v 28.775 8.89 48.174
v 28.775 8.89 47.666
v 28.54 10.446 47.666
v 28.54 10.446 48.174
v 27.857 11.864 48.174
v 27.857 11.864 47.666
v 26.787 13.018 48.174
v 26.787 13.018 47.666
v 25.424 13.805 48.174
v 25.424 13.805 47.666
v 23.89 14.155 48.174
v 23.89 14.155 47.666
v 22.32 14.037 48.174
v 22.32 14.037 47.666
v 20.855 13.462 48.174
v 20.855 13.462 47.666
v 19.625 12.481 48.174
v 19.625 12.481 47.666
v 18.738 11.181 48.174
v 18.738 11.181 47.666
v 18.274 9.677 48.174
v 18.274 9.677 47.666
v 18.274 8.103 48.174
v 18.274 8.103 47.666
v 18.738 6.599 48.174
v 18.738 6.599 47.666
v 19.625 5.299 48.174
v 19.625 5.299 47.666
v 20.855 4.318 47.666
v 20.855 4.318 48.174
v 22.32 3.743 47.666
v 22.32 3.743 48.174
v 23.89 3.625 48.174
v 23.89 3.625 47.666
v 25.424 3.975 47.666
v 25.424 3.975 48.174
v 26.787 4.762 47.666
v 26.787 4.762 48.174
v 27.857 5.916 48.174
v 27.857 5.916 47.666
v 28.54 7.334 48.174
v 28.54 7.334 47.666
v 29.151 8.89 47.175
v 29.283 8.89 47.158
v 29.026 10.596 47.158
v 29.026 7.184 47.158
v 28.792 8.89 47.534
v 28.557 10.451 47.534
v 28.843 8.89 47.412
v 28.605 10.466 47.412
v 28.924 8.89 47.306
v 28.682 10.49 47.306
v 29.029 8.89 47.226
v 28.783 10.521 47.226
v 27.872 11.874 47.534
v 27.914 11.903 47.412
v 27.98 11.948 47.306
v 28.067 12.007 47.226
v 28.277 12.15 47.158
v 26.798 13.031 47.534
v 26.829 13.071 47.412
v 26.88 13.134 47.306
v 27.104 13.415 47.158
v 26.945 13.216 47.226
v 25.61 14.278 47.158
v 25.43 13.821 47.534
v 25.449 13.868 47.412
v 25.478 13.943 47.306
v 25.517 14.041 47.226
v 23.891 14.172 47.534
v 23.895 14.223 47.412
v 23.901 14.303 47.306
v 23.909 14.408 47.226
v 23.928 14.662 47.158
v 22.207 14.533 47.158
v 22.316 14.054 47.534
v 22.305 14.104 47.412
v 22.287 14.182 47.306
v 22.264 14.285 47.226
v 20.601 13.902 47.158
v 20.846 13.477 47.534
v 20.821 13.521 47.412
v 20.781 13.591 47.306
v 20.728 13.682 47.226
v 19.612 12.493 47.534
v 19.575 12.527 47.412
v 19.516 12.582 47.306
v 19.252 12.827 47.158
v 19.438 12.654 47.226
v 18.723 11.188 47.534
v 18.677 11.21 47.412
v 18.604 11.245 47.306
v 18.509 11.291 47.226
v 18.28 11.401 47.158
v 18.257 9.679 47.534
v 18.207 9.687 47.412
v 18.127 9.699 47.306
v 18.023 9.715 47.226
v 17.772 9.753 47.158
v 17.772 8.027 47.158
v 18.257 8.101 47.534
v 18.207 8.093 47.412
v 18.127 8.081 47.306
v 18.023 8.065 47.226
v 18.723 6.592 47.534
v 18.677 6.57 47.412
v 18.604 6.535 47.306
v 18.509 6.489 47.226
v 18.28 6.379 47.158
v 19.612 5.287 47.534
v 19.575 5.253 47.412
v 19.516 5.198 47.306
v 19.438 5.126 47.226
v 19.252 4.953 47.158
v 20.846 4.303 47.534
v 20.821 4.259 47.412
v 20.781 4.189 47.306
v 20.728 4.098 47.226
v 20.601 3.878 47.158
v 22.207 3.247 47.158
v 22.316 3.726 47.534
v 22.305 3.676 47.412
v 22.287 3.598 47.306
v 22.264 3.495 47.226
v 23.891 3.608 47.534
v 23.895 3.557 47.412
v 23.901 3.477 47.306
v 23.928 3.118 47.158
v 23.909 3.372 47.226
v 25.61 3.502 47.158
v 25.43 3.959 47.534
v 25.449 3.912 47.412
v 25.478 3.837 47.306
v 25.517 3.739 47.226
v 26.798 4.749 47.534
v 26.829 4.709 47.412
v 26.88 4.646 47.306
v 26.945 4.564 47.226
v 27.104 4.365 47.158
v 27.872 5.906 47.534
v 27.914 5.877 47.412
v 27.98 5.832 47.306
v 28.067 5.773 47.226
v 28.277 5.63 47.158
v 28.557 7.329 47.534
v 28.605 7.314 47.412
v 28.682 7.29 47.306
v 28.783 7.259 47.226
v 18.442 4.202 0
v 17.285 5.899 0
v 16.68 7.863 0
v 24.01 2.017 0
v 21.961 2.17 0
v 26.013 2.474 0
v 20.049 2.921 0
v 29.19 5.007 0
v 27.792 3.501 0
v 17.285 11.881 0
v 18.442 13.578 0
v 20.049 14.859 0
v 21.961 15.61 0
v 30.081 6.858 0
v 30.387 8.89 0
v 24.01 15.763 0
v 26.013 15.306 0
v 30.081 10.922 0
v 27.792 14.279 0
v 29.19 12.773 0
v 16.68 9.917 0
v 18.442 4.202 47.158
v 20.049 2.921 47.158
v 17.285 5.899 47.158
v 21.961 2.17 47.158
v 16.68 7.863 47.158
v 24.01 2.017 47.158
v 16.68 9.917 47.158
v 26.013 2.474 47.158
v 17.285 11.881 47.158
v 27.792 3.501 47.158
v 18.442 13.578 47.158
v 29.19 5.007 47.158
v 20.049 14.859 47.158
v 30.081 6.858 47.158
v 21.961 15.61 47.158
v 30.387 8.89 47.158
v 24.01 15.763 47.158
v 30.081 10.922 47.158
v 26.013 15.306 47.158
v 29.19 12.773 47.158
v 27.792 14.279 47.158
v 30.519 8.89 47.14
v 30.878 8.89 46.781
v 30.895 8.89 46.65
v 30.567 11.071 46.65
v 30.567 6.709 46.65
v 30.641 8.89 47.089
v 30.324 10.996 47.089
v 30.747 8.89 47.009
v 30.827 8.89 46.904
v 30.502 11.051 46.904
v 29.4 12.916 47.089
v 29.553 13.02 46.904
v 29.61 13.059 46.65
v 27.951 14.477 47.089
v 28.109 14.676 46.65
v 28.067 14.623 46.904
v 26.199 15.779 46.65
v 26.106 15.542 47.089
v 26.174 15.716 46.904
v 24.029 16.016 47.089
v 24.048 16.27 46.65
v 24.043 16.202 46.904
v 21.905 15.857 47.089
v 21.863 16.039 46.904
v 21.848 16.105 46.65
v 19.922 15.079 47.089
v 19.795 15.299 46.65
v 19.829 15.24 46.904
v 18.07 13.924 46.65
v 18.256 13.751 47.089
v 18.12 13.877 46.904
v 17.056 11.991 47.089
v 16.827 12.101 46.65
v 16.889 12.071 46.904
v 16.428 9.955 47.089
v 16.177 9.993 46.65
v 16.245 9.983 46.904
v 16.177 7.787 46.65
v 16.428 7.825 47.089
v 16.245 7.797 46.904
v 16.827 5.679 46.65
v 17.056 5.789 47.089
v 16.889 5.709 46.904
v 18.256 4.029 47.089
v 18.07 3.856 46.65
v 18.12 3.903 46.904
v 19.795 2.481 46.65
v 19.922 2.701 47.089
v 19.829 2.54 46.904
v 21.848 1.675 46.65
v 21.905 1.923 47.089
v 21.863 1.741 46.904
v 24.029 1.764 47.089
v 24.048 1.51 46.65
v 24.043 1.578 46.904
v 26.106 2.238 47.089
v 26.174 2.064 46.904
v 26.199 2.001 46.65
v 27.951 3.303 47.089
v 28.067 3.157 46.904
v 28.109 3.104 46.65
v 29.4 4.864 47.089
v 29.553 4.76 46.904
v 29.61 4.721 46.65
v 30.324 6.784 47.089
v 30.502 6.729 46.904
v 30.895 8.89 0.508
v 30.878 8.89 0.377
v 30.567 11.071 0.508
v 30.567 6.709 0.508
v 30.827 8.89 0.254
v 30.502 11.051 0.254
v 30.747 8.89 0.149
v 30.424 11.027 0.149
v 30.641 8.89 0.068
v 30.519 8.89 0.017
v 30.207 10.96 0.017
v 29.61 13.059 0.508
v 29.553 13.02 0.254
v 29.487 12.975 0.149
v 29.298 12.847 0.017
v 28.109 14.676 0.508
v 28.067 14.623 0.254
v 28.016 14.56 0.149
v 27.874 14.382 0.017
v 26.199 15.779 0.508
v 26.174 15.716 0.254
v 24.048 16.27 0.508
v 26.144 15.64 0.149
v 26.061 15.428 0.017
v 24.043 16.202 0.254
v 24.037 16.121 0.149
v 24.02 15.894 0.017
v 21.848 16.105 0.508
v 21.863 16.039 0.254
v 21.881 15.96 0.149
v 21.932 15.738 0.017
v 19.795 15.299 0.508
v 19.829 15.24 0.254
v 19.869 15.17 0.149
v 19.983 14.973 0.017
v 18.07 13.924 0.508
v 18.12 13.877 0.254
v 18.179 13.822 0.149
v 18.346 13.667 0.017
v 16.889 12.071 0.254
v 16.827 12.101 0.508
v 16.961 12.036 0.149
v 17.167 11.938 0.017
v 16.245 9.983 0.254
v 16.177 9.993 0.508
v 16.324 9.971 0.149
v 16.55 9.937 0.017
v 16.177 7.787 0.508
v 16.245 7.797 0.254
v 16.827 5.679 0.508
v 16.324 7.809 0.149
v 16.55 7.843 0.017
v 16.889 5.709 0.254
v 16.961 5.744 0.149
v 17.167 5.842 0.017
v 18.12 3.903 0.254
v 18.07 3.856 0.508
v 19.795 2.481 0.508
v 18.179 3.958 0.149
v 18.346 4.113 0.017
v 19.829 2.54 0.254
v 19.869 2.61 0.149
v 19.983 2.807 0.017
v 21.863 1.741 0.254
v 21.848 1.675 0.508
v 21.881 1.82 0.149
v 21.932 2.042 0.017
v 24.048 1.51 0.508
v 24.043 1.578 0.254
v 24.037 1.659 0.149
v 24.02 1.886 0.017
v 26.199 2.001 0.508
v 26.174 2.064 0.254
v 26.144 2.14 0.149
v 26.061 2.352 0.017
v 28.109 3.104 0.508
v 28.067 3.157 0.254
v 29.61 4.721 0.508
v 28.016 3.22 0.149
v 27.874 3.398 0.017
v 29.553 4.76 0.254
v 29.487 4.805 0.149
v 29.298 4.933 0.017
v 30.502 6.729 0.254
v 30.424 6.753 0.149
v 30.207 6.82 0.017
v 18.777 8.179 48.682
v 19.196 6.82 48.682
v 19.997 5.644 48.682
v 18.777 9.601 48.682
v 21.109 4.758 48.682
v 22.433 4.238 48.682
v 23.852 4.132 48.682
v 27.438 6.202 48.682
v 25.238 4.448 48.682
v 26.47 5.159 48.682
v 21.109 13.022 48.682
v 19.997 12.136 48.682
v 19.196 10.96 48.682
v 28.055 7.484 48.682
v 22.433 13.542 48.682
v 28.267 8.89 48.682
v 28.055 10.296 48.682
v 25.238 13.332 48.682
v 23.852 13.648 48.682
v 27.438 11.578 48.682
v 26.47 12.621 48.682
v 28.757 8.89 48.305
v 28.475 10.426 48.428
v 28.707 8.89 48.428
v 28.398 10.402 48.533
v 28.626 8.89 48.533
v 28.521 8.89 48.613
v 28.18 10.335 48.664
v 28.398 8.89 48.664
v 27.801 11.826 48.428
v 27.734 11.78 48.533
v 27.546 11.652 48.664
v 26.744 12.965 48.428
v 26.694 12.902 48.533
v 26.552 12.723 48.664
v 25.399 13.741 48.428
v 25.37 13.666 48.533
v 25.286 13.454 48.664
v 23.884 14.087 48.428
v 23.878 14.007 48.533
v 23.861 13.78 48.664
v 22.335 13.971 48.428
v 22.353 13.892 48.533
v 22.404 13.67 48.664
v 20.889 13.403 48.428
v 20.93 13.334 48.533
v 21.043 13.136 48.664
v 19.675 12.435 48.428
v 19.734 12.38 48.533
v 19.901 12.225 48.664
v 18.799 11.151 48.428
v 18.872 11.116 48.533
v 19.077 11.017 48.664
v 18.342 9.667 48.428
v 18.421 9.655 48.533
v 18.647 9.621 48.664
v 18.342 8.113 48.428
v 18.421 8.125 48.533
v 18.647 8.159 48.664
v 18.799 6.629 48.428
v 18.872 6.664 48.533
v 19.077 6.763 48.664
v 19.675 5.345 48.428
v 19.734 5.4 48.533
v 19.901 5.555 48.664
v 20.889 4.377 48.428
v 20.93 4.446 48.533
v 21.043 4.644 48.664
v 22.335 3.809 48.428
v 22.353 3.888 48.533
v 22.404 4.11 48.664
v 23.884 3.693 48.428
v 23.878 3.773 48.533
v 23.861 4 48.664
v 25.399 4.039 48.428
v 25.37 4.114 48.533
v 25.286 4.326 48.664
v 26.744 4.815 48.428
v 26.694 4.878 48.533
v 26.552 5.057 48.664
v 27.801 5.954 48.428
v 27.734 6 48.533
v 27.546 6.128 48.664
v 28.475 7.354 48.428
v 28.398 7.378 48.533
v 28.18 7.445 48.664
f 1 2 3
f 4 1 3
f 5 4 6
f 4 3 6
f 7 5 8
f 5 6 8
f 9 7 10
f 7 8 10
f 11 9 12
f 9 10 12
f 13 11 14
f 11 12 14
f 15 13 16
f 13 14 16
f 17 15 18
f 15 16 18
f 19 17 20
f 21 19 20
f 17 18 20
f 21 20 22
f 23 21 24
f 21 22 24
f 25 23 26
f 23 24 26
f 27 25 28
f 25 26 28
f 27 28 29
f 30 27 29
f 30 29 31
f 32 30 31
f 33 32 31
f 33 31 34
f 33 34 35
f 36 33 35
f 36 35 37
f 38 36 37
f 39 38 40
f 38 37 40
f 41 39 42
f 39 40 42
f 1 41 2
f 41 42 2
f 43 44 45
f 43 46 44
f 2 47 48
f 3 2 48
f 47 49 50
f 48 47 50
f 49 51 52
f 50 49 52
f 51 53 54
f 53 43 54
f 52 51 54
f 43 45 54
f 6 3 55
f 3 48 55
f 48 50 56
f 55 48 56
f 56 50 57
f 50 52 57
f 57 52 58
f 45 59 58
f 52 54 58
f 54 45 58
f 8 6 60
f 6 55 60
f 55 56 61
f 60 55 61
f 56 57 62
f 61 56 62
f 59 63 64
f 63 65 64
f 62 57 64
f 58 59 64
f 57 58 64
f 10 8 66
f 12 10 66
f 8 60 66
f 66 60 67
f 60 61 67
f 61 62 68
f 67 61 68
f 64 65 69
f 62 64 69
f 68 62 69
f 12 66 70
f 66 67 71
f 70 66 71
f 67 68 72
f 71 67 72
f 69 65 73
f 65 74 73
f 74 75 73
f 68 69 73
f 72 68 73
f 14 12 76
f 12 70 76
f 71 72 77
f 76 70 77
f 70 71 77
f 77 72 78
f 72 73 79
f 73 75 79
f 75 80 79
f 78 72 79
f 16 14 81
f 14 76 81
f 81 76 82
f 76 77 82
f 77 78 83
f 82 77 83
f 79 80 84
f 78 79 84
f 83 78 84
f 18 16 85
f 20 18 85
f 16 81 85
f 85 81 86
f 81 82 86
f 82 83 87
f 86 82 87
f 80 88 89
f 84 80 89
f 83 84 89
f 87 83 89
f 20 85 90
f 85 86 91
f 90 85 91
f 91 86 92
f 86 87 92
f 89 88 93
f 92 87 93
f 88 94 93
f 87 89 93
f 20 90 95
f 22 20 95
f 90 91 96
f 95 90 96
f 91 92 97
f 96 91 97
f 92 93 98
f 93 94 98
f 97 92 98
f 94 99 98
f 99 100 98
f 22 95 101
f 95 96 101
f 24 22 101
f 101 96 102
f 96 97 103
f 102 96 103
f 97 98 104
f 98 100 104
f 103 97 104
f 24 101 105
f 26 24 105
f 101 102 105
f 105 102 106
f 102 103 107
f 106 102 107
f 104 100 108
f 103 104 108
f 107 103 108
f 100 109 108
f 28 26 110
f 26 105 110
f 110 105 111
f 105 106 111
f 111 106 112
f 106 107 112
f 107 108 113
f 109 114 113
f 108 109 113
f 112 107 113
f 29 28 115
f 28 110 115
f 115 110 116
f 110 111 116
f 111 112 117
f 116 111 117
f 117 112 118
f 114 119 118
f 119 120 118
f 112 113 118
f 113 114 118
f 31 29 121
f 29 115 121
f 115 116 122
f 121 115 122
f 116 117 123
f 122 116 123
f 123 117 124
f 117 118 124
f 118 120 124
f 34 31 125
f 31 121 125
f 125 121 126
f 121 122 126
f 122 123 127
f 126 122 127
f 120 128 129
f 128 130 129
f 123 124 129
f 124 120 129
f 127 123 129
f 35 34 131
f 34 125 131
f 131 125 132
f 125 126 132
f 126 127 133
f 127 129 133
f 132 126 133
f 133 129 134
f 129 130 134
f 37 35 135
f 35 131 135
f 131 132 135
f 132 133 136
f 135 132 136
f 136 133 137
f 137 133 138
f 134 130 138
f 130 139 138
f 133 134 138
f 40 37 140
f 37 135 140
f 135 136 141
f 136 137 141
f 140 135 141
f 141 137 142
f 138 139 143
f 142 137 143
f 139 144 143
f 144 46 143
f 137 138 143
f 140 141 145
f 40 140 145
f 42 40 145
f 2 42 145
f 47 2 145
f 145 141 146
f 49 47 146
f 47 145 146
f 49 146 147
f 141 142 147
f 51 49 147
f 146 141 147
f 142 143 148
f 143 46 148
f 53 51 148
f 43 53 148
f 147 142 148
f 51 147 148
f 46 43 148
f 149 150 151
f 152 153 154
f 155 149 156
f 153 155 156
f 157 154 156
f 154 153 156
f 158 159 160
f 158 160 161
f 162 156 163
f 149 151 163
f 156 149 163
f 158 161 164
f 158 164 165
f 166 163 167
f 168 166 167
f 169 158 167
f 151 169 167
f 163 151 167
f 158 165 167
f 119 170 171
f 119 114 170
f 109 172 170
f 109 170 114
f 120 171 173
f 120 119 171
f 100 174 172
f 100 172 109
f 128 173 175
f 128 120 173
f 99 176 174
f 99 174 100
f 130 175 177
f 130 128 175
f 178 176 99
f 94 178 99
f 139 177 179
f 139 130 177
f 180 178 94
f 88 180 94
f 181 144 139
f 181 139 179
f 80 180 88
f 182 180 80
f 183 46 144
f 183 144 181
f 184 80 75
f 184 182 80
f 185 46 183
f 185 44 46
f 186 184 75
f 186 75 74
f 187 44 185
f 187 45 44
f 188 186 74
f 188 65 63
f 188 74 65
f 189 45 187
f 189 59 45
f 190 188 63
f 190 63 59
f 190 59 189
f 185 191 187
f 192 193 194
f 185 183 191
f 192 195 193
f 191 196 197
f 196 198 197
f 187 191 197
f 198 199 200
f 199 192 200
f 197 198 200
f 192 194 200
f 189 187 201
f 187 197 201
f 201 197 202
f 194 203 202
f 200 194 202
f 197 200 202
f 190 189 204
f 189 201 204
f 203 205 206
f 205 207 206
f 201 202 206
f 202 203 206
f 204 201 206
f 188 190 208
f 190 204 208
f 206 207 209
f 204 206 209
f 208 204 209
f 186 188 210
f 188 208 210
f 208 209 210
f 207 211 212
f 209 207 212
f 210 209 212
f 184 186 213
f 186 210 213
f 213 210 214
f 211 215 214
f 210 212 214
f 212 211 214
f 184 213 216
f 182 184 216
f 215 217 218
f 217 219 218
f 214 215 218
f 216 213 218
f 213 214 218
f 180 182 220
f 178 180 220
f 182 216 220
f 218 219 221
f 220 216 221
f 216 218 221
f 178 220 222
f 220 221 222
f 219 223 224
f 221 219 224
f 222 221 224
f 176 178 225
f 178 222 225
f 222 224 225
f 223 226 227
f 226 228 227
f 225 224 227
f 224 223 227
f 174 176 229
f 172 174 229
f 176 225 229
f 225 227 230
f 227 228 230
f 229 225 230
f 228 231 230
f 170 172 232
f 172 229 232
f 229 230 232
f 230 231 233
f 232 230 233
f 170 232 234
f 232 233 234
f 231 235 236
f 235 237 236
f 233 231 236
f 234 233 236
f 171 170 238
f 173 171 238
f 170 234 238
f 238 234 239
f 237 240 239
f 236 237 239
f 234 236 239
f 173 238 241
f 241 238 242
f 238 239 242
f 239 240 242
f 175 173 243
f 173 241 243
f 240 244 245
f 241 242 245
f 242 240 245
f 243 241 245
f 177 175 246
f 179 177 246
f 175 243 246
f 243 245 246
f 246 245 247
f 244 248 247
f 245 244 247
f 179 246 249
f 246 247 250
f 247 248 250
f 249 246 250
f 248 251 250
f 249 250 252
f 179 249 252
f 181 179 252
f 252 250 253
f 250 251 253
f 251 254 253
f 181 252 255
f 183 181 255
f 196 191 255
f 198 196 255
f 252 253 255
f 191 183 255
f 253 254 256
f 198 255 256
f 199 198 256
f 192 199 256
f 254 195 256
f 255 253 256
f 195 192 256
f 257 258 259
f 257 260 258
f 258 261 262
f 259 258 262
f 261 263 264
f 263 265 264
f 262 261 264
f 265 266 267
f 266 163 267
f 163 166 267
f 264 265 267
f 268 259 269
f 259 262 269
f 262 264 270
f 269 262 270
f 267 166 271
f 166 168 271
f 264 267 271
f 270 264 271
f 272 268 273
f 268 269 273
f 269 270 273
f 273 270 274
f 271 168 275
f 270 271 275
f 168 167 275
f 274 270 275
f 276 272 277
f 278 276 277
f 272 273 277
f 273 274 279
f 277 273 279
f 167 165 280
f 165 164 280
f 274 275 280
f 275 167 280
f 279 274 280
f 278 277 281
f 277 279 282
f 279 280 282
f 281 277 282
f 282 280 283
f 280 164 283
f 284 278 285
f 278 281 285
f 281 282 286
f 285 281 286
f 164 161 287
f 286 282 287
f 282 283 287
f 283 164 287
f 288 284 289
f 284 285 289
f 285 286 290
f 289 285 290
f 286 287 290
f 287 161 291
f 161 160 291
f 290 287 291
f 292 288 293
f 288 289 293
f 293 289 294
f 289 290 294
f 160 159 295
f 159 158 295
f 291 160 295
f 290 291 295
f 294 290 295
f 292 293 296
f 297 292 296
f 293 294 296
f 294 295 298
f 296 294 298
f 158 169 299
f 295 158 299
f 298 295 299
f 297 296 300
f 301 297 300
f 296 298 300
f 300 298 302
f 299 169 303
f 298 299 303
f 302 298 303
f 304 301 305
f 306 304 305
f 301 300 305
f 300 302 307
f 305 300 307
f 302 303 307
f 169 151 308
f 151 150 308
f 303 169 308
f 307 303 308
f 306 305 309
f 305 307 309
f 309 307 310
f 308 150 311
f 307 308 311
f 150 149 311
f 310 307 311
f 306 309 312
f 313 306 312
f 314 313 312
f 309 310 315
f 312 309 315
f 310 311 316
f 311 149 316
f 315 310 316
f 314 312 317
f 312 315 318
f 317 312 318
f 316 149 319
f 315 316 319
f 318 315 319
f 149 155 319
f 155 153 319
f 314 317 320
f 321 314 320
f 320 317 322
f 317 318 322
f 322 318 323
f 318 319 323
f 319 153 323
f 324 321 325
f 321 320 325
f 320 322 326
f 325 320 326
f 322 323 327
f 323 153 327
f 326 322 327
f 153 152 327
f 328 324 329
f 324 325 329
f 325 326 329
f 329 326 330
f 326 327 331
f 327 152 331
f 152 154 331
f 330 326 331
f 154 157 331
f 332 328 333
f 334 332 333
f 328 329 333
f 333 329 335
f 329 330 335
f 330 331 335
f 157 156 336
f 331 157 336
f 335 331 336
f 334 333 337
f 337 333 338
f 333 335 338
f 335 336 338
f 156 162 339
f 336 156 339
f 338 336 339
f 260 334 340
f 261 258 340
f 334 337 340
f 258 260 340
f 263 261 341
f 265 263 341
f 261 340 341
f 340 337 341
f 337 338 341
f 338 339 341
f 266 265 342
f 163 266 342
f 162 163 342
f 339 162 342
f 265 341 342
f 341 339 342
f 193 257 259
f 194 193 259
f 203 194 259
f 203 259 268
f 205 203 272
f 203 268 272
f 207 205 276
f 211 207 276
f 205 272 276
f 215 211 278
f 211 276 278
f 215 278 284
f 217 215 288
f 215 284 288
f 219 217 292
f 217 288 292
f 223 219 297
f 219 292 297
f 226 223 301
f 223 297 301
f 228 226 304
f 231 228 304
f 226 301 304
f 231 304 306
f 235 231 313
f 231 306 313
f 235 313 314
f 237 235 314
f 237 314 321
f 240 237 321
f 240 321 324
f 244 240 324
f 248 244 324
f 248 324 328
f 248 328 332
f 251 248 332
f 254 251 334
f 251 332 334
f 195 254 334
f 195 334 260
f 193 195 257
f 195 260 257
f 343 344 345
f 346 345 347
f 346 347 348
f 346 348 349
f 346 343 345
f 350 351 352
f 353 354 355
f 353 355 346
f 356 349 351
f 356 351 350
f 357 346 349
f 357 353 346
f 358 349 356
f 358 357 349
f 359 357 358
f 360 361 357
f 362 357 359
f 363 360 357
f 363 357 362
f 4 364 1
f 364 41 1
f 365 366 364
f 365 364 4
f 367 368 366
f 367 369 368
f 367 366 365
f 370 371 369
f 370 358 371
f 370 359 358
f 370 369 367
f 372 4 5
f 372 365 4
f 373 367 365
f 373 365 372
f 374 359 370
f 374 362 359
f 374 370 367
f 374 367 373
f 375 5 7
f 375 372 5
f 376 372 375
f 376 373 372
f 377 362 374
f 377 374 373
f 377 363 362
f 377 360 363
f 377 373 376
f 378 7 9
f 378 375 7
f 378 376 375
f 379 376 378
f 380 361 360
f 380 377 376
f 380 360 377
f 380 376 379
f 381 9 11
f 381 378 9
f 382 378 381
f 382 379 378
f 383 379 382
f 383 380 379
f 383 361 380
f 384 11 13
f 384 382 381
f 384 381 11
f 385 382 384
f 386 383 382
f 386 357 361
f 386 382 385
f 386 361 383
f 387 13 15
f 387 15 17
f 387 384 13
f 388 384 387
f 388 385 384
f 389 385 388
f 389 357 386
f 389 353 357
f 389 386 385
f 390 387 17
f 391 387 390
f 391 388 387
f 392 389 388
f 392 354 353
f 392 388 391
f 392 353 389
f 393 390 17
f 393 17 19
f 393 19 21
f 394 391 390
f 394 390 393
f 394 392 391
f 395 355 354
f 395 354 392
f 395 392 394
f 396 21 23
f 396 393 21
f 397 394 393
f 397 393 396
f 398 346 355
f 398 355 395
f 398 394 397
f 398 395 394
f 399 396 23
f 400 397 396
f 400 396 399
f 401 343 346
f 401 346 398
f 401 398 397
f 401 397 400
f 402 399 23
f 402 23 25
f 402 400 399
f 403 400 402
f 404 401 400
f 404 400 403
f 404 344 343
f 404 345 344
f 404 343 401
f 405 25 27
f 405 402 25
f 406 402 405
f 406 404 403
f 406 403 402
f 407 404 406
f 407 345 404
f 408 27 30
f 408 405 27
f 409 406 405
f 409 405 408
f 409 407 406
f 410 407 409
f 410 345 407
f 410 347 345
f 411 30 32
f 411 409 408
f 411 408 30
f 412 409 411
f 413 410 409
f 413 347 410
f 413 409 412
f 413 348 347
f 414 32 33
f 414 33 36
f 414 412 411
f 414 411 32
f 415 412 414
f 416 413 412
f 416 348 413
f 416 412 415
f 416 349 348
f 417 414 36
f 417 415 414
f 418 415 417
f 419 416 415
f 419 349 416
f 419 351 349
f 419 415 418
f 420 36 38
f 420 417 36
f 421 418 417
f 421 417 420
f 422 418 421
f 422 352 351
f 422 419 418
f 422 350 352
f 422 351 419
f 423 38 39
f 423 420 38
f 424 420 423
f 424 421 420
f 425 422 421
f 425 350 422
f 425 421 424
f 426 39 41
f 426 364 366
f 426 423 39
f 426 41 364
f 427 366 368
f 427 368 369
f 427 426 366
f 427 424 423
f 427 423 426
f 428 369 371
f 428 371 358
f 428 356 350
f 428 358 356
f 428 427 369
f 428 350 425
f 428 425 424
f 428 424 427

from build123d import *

# Parameters (mm, degrees)
SKETCH1_R           = 7.400445615
BOSS_EXTRUDE1_DEPTH = 47.157501005
SKETCH2_R           = 5.279749884
BOSS_EXTRUDE2_DEPTH = 1.524
FILLET1_R           = 0.508
FILLET2_R           = 0.508
FILLET3_R           = 0.508


with BuildPart() as part:
    # Sketch1 → Boss-Extrude1 (new body)
    with BuildSketch(Plane.XY):
        with Locations((23.495, 8.89)):
            Circle(SKETCH1_R)
    extrude(amount=BOSS_EXTRUDE1_DEPTH)

    # Sketch2 → Boss-Extrude2 (add)
    with BuildSketch(Plane.XY.offset(47.157501005)):
        with Locations((23.495, 8.89)):
            Circle(SKETCH2_R)
    extrude(amount=BOSS_EXTRUDE2_DEPTH)

    # Fillet1
    fillet1_edges = [part.edges().sort_by_distance(p)[0] for p in [
        (18.215250116, 8.89, 48.681501005),
    ]]
    fillet(fillet1_edges, radius=FILLET1_R)

    # Fillet2
    fillet2_edges = [part.edges().sort_by_distance(p)[0] for p in [
        (16.094554385, 8.89, 47.157501005),
        (18.215250116, 8.89, 47.157501005),
    ]]
    fillet(fillet2_edges, radius=FILLET2_R)

    # Fillet3
    fillet3_edges = [part.edges().sort_by_distance(p)[0] for p in [
        (16.094554385, 8.89, 0),
    ]]
    fillet(fillet3_edges, radius=FILLET3_R)


solid = part.part
